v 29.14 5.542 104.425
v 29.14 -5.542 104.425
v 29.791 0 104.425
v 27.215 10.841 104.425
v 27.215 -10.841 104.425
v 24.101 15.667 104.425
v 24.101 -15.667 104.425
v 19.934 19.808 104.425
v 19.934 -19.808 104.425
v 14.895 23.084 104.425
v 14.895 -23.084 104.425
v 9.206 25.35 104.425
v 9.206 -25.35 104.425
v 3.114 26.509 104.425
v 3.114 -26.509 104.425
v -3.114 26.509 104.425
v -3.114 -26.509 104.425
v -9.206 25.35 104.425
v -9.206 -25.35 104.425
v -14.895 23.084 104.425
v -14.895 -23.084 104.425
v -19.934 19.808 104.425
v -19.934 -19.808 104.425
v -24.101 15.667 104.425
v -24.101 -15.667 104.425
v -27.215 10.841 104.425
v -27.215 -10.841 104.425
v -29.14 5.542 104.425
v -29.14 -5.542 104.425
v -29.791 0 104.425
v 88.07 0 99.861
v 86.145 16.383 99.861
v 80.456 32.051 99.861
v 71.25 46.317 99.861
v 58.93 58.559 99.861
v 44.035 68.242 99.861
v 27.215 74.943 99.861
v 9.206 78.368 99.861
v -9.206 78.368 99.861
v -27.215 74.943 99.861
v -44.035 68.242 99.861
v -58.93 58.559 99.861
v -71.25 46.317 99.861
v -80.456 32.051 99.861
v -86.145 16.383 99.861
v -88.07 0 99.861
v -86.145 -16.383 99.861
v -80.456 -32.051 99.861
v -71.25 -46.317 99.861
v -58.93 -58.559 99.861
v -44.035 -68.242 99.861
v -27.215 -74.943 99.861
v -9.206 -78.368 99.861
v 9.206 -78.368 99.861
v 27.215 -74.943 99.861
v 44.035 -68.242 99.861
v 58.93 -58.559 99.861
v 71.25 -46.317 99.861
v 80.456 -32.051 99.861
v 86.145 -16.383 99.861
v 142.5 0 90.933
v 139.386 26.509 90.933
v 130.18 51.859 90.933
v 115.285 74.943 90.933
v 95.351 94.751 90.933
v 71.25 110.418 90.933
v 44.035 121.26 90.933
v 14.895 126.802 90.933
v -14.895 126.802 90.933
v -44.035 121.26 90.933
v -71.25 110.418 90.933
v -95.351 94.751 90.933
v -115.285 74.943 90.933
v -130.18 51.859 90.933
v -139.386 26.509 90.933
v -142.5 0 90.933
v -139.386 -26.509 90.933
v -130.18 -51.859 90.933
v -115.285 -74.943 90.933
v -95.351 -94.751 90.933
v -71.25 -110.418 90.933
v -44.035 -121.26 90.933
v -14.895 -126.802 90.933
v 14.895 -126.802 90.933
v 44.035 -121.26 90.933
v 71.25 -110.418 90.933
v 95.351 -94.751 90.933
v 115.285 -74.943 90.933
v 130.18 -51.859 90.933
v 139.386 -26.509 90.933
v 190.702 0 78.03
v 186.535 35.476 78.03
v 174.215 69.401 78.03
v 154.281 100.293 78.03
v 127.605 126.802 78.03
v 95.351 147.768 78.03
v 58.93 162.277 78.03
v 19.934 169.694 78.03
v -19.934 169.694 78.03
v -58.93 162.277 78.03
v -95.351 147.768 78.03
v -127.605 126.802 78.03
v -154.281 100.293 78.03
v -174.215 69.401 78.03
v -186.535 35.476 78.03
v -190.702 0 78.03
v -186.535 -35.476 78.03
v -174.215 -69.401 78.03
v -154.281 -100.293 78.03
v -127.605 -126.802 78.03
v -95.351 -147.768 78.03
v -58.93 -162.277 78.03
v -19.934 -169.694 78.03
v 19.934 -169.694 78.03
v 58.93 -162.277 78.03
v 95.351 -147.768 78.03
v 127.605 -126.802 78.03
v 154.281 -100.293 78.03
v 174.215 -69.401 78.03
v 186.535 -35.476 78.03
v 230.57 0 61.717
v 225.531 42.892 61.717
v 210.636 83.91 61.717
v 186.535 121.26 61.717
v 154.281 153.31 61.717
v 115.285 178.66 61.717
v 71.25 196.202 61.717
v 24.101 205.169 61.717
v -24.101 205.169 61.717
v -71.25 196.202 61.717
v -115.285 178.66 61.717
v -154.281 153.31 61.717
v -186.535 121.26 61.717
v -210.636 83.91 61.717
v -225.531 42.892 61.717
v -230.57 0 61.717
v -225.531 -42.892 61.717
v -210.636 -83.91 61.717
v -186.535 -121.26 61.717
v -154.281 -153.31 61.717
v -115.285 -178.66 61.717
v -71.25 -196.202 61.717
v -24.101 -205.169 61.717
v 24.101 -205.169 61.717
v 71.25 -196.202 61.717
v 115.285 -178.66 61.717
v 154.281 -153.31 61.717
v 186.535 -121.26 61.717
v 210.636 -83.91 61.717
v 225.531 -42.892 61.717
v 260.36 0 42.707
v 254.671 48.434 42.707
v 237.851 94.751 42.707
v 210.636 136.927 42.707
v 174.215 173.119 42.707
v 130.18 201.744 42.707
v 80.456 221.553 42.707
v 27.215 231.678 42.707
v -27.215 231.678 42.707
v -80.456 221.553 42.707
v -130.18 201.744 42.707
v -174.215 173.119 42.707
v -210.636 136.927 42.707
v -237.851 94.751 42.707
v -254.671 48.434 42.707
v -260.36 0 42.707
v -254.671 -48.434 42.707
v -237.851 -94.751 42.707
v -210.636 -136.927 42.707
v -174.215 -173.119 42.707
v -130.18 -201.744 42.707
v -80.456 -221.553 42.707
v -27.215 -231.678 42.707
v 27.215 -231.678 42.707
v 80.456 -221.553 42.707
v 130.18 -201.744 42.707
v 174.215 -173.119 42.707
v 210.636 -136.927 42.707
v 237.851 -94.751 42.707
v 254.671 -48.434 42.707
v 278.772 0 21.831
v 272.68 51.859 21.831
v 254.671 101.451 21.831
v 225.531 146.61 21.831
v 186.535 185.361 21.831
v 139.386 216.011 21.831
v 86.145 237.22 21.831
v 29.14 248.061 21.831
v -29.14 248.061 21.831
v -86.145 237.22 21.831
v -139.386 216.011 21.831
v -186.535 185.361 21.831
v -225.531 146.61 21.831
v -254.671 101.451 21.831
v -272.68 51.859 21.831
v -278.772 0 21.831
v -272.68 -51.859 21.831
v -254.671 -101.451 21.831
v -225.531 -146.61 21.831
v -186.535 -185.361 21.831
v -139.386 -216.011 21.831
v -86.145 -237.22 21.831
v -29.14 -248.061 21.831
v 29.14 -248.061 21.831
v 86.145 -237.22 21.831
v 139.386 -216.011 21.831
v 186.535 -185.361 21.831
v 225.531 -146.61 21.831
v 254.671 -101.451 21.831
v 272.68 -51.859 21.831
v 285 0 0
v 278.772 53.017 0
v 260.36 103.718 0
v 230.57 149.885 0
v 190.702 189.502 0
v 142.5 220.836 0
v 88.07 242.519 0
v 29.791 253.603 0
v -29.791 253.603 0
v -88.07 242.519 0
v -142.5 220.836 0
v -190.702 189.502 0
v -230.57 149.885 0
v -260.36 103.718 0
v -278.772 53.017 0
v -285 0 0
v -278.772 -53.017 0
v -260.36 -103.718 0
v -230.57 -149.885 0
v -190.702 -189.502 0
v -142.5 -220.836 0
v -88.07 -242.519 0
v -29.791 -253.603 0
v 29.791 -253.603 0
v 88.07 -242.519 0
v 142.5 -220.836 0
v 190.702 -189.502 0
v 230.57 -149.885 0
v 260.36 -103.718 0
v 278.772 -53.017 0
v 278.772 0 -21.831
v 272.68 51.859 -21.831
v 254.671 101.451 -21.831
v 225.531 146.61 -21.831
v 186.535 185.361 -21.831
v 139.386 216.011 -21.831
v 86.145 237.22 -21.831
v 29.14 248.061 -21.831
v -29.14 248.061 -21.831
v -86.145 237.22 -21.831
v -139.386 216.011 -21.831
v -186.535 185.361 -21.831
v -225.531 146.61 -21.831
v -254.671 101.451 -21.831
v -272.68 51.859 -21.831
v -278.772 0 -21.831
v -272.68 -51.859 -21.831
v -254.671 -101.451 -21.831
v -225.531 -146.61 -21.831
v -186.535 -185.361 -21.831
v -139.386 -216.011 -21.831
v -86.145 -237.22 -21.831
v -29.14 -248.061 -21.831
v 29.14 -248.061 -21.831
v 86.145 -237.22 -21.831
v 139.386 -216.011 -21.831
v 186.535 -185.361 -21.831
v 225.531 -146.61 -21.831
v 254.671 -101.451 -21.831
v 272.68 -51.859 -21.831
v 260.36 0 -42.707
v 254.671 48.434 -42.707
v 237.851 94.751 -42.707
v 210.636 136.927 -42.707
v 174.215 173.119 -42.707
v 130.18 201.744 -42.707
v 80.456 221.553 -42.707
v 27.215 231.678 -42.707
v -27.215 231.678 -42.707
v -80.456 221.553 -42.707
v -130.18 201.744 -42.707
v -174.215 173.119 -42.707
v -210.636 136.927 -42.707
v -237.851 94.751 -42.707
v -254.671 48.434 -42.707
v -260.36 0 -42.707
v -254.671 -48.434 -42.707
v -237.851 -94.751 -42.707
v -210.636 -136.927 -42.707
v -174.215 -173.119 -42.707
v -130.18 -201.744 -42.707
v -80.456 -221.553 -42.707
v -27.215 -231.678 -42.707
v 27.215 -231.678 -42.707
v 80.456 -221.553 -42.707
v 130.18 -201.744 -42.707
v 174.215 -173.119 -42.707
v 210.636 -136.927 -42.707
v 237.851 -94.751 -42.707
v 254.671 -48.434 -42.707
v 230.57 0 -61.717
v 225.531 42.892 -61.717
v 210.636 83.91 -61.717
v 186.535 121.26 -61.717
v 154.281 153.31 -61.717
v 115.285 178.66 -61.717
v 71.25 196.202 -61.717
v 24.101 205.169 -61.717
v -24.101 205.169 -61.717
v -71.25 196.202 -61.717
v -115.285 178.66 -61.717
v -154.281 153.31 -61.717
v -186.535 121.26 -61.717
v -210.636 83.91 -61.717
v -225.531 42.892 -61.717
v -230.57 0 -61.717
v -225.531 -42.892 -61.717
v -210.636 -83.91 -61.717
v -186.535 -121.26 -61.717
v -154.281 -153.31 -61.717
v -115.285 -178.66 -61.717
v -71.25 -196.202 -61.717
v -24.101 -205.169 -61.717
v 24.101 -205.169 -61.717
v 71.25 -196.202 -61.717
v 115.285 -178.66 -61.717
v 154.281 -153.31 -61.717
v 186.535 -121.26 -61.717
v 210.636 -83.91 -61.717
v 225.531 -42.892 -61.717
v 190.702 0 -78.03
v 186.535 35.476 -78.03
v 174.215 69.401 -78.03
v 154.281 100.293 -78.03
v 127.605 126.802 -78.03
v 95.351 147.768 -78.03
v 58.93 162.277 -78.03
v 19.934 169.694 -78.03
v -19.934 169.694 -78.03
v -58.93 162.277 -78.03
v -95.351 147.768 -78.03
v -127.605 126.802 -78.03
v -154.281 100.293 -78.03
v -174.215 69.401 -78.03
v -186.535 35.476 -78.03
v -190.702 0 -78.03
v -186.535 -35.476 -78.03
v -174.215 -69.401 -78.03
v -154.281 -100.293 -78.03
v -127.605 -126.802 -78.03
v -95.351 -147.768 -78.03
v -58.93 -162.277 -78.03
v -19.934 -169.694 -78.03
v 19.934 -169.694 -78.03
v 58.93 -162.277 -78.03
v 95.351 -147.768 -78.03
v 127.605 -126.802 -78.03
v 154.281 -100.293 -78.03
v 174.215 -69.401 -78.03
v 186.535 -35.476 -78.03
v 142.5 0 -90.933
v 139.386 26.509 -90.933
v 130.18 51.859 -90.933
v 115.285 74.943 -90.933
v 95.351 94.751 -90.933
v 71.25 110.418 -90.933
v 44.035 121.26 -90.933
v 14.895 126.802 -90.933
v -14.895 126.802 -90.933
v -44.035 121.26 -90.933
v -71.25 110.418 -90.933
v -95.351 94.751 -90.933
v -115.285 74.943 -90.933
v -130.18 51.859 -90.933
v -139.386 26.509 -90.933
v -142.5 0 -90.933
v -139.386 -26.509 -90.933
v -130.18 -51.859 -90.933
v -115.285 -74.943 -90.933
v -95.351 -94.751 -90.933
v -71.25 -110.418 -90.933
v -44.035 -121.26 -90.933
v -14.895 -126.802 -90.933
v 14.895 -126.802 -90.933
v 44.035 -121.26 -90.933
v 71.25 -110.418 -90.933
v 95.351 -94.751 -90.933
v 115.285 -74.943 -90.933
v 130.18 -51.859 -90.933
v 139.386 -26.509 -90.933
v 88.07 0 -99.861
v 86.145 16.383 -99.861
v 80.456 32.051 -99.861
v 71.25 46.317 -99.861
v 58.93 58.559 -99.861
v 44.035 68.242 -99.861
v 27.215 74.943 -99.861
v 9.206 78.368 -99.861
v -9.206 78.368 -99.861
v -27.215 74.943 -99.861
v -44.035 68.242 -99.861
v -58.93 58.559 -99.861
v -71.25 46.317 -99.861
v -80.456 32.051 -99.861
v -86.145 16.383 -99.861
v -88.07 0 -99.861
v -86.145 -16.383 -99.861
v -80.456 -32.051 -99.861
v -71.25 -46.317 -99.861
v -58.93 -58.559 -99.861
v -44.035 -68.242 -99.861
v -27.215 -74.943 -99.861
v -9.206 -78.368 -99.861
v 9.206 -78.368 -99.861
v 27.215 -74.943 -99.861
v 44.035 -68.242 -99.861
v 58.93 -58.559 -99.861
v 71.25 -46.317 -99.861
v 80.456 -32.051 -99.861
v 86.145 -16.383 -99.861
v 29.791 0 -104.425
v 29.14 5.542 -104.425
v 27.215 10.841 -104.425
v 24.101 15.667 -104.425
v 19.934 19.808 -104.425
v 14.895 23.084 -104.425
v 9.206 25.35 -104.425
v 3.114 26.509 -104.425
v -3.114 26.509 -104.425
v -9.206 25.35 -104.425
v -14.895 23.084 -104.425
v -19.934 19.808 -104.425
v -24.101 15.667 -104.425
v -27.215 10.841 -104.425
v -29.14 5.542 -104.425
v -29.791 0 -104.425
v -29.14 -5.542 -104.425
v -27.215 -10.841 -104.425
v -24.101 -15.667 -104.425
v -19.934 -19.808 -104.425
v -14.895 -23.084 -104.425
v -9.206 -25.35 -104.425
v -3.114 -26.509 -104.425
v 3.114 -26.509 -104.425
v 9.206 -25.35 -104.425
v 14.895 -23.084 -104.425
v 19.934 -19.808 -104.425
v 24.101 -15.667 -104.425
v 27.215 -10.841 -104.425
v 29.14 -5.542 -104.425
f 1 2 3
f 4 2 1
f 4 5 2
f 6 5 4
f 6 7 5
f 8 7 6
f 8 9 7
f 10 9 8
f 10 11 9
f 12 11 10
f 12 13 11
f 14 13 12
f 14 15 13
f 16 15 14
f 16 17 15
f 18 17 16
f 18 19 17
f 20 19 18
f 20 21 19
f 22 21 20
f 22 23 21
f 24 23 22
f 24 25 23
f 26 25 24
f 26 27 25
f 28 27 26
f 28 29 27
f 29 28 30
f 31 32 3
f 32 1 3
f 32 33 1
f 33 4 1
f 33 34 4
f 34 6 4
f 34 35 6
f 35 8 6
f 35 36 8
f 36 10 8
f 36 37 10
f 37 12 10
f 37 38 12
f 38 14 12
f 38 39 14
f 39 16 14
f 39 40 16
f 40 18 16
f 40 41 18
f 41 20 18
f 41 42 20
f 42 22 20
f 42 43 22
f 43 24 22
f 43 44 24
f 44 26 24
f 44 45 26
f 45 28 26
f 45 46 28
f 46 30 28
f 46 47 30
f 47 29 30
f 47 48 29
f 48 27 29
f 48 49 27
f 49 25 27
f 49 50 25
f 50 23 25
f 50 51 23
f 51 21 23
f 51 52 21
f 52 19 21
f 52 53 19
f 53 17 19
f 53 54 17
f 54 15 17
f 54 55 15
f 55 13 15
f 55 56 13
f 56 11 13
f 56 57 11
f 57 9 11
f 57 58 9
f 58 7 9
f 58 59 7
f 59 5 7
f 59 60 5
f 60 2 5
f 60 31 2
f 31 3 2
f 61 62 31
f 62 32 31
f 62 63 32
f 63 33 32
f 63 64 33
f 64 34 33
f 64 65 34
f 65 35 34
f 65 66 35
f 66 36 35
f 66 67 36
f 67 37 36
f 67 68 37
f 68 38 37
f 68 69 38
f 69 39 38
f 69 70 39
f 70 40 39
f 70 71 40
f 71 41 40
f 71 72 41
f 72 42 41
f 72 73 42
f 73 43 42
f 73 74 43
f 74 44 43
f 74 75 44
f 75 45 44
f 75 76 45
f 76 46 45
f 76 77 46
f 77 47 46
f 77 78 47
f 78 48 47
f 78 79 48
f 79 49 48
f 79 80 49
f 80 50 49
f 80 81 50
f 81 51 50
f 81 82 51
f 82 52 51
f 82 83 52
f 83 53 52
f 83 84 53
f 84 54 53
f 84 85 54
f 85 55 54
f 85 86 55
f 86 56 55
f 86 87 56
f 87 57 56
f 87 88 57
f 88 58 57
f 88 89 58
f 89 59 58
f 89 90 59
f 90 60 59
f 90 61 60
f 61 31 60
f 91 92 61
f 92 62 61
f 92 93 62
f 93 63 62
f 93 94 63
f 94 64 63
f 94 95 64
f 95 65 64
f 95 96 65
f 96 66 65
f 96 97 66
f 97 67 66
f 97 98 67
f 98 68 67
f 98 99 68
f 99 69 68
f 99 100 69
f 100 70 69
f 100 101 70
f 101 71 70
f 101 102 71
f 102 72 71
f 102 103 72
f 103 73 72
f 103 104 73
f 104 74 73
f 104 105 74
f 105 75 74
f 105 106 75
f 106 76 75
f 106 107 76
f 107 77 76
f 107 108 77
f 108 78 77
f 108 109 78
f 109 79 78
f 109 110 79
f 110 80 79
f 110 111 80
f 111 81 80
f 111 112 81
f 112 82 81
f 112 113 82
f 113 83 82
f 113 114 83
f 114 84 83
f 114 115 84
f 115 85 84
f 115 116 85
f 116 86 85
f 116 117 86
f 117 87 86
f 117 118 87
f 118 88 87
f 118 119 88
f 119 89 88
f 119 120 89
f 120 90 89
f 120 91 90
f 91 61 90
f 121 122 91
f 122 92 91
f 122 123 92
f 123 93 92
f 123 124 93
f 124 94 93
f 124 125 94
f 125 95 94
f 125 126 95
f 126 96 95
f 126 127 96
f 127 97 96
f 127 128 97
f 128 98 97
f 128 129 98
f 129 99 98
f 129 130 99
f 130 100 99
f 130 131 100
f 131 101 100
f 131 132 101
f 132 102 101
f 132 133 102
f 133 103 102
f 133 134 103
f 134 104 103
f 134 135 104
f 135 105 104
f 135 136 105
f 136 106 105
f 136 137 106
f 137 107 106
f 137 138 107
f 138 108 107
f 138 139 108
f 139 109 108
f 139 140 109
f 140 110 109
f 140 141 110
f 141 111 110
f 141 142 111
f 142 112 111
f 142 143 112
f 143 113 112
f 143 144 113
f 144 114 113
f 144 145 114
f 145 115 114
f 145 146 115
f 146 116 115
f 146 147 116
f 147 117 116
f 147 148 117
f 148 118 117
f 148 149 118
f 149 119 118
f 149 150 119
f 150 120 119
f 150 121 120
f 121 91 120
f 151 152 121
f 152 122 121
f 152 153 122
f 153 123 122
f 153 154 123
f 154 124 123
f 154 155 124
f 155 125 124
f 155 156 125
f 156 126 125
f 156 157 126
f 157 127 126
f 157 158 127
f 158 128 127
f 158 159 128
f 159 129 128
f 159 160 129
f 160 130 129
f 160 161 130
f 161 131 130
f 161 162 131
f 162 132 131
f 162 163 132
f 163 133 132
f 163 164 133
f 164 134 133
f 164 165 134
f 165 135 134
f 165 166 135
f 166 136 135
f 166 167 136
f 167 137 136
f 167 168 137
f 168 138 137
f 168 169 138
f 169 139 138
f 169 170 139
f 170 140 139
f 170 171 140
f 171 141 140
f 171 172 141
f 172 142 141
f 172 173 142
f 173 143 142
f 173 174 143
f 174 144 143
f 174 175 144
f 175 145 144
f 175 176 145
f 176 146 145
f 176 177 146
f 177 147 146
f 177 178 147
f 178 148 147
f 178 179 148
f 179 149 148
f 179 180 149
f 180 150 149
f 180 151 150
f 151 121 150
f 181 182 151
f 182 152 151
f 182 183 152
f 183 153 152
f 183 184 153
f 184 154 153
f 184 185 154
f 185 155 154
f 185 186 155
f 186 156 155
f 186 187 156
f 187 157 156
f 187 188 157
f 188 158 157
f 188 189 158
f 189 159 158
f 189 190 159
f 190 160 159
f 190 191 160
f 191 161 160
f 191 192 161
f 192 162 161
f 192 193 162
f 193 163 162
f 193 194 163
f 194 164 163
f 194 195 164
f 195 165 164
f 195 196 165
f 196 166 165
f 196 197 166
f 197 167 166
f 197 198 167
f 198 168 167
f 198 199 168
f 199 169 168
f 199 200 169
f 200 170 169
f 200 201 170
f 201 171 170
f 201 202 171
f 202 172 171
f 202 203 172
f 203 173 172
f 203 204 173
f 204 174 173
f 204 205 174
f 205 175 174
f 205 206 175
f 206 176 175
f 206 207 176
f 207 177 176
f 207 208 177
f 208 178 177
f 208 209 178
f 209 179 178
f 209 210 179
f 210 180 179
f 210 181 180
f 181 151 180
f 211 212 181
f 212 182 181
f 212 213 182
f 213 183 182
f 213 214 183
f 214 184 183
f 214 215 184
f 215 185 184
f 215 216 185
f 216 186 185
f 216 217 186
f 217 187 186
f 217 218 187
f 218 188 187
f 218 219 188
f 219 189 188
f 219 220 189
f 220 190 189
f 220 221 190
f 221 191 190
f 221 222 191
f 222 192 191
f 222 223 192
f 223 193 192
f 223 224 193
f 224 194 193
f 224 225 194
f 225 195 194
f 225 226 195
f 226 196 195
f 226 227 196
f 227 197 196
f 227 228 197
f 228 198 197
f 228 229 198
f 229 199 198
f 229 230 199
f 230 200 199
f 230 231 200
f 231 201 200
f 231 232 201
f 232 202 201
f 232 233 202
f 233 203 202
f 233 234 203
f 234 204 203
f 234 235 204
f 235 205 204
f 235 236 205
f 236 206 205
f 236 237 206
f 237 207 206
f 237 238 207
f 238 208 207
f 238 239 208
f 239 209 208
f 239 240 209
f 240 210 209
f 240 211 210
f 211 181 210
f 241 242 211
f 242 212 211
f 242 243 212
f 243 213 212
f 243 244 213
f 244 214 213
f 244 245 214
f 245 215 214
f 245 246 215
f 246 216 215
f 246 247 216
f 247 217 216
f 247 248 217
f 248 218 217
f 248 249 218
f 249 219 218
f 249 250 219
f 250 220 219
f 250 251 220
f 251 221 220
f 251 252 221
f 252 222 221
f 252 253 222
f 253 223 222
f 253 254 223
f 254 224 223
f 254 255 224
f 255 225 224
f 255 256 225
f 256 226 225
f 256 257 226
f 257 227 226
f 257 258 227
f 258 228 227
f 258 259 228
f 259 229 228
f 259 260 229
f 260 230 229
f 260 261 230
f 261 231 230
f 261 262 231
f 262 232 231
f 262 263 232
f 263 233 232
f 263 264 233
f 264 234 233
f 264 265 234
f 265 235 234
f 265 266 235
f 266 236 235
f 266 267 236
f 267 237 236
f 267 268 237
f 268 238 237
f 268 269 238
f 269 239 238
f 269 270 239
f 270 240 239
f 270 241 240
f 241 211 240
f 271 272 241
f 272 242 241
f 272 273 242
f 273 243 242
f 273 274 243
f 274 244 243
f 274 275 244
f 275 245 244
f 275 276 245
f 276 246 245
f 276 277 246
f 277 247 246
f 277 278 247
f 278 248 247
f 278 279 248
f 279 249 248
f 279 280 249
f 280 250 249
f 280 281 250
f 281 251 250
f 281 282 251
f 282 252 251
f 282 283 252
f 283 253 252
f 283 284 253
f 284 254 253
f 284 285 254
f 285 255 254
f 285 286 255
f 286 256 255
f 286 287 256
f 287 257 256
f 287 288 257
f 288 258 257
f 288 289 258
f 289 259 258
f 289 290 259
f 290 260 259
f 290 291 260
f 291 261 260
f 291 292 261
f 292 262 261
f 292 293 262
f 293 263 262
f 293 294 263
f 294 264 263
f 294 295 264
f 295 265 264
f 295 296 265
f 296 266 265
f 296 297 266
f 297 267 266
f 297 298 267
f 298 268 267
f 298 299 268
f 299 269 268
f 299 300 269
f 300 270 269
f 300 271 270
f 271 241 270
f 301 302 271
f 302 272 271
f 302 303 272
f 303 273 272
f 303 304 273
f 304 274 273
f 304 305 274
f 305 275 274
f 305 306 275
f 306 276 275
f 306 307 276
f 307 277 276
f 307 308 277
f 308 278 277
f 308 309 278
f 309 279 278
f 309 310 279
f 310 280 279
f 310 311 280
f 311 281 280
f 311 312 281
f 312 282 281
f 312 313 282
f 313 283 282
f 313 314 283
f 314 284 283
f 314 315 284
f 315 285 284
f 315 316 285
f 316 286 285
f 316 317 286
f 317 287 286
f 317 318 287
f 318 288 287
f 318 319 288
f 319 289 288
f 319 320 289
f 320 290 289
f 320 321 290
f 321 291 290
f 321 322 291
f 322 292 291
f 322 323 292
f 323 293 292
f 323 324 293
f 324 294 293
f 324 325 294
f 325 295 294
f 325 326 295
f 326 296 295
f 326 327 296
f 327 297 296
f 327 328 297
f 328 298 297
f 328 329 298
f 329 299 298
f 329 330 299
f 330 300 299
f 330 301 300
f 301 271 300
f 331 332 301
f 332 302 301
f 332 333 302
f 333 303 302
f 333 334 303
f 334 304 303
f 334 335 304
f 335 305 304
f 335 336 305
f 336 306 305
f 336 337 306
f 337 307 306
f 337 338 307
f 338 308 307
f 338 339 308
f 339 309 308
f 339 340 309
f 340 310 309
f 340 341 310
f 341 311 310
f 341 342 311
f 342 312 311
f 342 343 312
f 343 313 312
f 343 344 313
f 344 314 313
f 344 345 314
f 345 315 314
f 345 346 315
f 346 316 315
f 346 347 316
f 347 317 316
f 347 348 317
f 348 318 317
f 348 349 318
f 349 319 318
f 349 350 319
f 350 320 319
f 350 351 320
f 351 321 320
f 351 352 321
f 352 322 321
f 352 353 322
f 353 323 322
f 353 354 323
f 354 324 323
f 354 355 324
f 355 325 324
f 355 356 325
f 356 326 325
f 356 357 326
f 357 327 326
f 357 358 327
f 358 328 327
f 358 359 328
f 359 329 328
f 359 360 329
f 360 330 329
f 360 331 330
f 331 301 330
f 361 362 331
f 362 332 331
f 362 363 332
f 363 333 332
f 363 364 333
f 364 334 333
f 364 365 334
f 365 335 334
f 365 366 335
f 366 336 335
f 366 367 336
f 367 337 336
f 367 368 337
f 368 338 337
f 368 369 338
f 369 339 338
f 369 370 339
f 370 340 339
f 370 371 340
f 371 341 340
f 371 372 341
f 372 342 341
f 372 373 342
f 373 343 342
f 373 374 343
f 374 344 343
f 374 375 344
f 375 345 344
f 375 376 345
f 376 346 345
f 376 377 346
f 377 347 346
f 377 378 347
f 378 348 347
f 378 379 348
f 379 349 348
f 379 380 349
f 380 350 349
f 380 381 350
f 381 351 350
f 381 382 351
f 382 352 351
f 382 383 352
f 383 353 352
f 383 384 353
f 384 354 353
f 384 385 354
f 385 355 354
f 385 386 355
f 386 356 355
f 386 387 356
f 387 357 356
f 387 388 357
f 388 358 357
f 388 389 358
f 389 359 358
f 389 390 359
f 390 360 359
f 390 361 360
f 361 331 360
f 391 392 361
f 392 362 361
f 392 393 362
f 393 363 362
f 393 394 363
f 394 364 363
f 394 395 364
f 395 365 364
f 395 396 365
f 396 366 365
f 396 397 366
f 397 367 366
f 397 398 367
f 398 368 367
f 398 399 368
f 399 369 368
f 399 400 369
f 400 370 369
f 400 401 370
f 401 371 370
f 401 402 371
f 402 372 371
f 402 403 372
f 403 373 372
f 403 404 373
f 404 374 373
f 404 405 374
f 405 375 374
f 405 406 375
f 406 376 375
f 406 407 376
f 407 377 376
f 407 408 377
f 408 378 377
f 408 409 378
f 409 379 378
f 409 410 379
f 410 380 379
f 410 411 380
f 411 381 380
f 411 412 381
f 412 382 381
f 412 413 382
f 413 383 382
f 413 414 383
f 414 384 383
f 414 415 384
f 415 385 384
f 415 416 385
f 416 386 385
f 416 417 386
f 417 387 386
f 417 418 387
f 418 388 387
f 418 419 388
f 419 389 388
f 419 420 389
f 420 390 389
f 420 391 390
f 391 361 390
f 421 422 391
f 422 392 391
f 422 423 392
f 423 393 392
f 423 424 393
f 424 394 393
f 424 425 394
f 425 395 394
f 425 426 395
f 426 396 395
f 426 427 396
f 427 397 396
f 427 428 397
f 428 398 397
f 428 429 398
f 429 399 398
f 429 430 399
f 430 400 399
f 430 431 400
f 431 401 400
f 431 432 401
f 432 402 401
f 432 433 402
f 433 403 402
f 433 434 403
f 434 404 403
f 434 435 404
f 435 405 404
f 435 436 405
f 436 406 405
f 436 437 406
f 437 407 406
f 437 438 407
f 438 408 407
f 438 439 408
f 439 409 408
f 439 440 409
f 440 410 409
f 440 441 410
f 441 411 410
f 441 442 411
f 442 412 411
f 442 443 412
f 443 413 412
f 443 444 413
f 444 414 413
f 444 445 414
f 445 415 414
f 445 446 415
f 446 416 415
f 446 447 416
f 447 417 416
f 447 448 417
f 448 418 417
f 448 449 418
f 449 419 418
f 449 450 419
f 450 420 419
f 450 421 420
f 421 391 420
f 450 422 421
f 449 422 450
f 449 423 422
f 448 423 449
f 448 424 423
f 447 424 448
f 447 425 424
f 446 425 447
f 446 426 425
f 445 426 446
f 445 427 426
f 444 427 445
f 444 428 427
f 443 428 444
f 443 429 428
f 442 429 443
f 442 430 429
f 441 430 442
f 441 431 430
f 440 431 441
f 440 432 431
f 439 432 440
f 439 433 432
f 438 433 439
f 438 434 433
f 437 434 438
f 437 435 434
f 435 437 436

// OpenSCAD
// Generated by SolidPython 1.0.1 on 2020-07-29 00:46:54


scale(v = [19, 17, 7]) {
	sphere(r = 15);
}
/***********************************************
*********      SolidPython code:      **********
************************************************
 
# import packages: SolidPython
from solid import *
from solid.utils import *
from itertools import chain, combinations, permutations


class Resize:

    def __init__(self, scad_file):
        self.scad_file = scad_file
        #self.scad_file = import_scad(scad_file)
        # cone/cylinder param:
        self.r1 = 0
        self.r2 = 0
        self.h = 0
        # rectangular prism param:
        self.w = 0
        self.l = 0
        # ellipse param:
        self.r = 0

    # import OpenScad code (file name corresponds to shape)


    # classify shape + parameters
    def assign(self, param1, param2, param3):
        if self.scad_file == 'cone.scad':
            self.r1 = param1
            self.r2 = param2
            self.h = param3
        elif self.scad_file == 'cylinder.scad':
            self.r1 = param1
            self.r2 = param2
            self.h = param3
        elif self.scad_file == 'rectangularPrism.scad':
            self.h = param1
            self.l = param2
            self.w = param3
        else:
            self.r = param1
            self.h = param2

    # resize parameters
    def iterate(self):
        x = range(3, 20, 2)
        i = 1
        if self.scad_file == 'cone.scad':
            tempList = list(permutations(x, 2))
            for temp in tempList:
                param1 = temp[0]
                param2 = temp[1]
                filepath = 'produced_scad_files/' + 'cone' + str(param1) + '_' + str(param2) + '_' + '.scad'
                scad_render_to_file(cylinder(h=param1, r1=param2, r2=0), filepath)

        elif self.scad_file == 'cylinder.scad':
            tempList = list(permutations(x, 3))
            for temp in tempList:
                param1 = temp[0]
                param2 = temp[1]
                filepath = 'produced_scad_files/' + 'cylinder' + str(param1) + '_' + str(param2) + '_' + '.scad'
                scad_render_to_file(cylinder(h=param1, r1=param2, r2=param2), filepath)

        elif self.scad_file == 'rectangularPrism.scad':
            tempList = list(permutations(x, 3))
            for temp in tempList:
                param1 = temp[0]
                param2 = temp[1]
                param3 = temp[2]
                filepath = 'produced_scad_files/' + 'rectangularPrism' + str(param1) + '_' + str(param2) + '_' + str(
                    param3) + '.scad'
                scad_render_to_file(cube(size=(param1, param2, param3)), filepath)

        elif self.scad_file == 'ellipse.scad':
            tempList = list(permutations(x, 4))
            for temp in tempList:
                param1 = temp[0]
                param2 = temp[1]
                param3 = temp[2]
                param4 = temp[3]
                filepath = 'produced_scad_files/' + 'ellipse' + str(param1) + '_' + str(param2) + '_' + str(param3) + '_' + str(param4) + '.scad'
                scad_render_to_file(scale([param1, param2, param3])(sphere(r=param4)), filepath)

    def render_to_scadfile(self):
        scad_render_to_file(scad, 'example.scad') 
 
************************************************/
